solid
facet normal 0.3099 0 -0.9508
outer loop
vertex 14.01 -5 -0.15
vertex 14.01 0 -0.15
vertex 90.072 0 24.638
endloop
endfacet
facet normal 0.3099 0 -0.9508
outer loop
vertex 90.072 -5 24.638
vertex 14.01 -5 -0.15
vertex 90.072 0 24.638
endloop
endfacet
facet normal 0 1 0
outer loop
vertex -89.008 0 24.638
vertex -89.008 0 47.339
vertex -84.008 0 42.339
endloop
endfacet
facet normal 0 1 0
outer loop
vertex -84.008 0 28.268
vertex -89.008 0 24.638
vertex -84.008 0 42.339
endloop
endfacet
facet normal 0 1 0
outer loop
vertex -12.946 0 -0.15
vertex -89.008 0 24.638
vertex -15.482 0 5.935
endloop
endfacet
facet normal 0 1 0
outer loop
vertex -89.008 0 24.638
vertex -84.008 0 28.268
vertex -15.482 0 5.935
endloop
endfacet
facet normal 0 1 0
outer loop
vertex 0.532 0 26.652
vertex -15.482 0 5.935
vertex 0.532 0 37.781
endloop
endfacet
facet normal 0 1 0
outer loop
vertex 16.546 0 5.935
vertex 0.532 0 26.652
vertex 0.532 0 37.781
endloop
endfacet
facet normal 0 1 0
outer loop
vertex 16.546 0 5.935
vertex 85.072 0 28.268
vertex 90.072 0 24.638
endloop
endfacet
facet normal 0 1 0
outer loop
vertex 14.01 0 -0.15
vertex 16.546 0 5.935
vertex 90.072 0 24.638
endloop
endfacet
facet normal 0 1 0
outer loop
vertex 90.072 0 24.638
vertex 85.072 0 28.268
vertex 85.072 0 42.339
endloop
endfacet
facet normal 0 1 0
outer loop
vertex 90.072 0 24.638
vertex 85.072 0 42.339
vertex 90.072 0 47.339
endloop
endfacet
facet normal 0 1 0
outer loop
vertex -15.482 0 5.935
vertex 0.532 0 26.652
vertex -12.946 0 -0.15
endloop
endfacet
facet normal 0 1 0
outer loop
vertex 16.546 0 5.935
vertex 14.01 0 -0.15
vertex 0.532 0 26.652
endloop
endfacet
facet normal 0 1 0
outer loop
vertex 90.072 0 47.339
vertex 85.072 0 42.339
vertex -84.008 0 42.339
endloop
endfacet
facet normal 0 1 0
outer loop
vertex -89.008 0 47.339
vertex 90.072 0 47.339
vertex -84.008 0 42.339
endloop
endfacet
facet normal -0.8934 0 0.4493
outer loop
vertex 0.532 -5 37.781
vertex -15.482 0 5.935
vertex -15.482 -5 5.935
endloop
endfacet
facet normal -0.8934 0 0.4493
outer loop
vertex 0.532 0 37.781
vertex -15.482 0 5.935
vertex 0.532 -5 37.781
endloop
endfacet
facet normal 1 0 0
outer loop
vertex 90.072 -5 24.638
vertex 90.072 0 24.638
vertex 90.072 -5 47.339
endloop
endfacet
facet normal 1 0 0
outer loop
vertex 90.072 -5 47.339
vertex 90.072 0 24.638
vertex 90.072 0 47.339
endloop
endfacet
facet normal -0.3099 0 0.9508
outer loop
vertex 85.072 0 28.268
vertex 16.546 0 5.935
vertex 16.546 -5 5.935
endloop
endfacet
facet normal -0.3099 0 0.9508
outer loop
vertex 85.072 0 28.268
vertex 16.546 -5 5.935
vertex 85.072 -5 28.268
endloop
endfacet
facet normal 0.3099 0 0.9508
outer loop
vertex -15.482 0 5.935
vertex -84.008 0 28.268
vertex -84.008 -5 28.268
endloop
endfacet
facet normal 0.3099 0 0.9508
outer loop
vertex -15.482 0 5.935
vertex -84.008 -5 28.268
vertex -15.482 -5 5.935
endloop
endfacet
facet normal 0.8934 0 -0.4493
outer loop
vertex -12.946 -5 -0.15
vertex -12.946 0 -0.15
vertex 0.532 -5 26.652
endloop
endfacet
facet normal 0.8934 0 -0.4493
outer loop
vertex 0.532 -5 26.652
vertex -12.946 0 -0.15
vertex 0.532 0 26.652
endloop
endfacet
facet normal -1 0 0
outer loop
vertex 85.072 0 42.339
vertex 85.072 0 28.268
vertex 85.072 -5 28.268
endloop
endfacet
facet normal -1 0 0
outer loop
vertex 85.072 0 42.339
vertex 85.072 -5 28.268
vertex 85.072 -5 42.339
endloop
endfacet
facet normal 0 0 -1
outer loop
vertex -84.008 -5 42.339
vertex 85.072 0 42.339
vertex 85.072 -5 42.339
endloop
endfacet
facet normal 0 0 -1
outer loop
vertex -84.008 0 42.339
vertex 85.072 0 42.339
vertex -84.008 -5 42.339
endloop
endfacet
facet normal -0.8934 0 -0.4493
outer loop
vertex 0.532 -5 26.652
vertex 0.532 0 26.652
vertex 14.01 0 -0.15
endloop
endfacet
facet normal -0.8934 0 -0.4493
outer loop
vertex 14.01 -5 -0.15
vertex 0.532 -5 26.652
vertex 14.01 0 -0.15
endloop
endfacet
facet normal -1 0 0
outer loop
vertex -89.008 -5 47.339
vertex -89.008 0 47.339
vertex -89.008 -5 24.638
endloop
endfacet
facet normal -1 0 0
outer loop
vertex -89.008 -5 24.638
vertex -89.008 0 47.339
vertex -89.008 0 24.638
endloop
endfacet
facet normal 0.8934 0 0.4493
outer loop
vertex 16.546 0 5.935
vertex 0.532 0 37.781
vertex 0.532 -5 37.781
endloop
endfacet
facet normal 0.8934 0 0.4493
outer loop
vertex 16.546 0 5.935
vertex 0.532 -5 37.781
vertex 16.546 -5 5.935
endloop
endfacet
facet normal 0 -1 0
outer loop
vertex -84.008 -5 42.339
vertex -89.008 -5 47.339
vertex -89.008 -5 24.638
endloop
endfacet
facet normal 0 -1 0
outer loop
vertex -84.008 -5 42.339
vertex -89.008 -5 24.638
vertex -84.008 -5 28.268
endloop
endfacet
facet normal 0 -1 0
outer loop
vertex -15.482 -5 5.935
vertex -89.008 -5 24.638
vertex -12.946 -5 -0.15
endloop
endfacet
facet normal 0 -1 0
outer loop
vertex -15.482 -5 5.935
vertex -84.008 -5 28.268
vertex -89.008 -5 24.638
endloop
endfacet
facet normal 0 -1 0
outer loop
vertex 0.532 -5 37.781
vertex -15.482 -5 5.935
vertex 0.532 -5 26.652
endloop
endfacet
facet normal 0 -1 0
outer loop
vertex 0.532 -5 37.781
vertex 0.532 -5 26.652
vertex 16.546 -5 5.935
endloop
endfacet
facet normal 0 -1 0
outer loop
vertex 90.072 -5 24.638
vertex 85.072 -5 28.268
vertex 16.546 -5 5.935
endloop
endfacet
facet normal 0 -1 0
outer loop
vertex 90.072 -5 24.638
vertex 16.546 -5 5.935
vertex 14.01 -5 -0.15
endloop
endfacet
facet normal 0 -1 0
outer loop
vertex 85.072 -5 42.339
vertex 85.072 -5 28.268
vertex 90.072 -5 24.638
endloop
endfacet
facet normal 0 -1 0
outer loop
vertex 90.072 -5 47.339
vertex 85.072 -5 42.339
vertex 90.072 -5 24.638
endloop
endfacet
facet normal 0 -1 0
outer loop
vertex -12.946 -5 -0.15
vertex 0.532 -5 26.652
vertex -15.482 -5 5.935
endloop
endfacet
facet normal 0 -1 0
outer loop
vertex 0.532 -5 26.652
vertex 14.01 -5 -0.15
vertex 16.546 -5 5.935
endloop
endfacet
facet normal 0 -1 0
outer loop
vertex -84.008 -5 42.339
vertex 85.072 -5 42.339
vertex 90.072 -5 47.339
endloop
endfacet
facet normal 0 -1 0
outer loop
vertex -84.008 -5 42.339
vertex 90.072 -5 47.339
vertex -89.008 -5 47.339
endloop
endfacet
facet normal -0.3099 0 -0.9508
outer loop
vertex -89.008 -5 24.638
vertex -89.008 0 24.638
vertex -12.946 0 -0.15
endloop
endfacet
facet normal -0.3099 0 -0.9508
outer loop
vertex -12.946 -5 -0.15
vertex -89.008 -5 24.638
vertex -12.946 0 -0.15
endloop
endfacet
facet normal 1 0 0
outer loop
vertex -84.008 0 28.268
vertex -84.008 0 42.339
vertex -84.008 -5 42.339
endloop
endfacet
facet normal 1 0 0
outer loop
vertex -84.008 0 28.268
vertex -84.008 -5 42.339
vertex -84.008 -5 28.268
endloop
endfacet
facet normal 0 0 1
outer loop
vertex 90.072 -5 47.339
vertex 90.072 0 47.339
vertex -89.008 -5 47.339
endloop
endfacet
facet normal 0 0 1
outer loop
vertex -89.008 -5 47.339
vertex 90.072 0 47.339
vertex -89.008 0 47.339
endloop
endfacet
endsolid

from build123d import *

# Parameters (mm, degrees)
F1_DEPTH = 150
F3_DEPTH = 163
F4_DEPTH = 145


with BuildPart() as f1:
    # F0 (on Front) → F1 (new body)
    with BuildSketch(Plane.XZ):
        Polygon((90.0722037068, 47.3391901924), (0.5319875367, 47.3391901924), (-89.0082286333, 47.3391901924), (-89.0082286333, 24.6384392554), (-12.9456477409, -0.1503442564), (0.5319875367, 26.651770349), (14.0096228144, -0.1503442564), (90.0722037068, 24.6384392554), align=None)
    extrude(amount=F1_DEPTH)

    # F2 (on Front) → F3 (cut)
    with BuildSketch(Plane.XZ):
        Polygon((-15.4821047033, 5.9351143447), (0.5319875367, 37.7813193113), (16.5460797768, 5.9351143447), (85.0722036495, 28.2677676632), (85.0722036495, 42.3391901351), (-84.008228576, 42.3391901351), (-84.008228576, 28.2677676632), align=None)
    extrude(amount=F3_DEPTH, mode=Mode.SUBTRACT)

    # F4 (cut): a face of the model
    f4_faces = [f1.faces().sort_by_distance(p)[0] for p in [
        (0.5319875367, -150, 29.1828717422),
    ]]
    extrude(f4_faces, amount=-F4_DEPTH, mode=Mode.SUBTRACT)


solid = f1.part
